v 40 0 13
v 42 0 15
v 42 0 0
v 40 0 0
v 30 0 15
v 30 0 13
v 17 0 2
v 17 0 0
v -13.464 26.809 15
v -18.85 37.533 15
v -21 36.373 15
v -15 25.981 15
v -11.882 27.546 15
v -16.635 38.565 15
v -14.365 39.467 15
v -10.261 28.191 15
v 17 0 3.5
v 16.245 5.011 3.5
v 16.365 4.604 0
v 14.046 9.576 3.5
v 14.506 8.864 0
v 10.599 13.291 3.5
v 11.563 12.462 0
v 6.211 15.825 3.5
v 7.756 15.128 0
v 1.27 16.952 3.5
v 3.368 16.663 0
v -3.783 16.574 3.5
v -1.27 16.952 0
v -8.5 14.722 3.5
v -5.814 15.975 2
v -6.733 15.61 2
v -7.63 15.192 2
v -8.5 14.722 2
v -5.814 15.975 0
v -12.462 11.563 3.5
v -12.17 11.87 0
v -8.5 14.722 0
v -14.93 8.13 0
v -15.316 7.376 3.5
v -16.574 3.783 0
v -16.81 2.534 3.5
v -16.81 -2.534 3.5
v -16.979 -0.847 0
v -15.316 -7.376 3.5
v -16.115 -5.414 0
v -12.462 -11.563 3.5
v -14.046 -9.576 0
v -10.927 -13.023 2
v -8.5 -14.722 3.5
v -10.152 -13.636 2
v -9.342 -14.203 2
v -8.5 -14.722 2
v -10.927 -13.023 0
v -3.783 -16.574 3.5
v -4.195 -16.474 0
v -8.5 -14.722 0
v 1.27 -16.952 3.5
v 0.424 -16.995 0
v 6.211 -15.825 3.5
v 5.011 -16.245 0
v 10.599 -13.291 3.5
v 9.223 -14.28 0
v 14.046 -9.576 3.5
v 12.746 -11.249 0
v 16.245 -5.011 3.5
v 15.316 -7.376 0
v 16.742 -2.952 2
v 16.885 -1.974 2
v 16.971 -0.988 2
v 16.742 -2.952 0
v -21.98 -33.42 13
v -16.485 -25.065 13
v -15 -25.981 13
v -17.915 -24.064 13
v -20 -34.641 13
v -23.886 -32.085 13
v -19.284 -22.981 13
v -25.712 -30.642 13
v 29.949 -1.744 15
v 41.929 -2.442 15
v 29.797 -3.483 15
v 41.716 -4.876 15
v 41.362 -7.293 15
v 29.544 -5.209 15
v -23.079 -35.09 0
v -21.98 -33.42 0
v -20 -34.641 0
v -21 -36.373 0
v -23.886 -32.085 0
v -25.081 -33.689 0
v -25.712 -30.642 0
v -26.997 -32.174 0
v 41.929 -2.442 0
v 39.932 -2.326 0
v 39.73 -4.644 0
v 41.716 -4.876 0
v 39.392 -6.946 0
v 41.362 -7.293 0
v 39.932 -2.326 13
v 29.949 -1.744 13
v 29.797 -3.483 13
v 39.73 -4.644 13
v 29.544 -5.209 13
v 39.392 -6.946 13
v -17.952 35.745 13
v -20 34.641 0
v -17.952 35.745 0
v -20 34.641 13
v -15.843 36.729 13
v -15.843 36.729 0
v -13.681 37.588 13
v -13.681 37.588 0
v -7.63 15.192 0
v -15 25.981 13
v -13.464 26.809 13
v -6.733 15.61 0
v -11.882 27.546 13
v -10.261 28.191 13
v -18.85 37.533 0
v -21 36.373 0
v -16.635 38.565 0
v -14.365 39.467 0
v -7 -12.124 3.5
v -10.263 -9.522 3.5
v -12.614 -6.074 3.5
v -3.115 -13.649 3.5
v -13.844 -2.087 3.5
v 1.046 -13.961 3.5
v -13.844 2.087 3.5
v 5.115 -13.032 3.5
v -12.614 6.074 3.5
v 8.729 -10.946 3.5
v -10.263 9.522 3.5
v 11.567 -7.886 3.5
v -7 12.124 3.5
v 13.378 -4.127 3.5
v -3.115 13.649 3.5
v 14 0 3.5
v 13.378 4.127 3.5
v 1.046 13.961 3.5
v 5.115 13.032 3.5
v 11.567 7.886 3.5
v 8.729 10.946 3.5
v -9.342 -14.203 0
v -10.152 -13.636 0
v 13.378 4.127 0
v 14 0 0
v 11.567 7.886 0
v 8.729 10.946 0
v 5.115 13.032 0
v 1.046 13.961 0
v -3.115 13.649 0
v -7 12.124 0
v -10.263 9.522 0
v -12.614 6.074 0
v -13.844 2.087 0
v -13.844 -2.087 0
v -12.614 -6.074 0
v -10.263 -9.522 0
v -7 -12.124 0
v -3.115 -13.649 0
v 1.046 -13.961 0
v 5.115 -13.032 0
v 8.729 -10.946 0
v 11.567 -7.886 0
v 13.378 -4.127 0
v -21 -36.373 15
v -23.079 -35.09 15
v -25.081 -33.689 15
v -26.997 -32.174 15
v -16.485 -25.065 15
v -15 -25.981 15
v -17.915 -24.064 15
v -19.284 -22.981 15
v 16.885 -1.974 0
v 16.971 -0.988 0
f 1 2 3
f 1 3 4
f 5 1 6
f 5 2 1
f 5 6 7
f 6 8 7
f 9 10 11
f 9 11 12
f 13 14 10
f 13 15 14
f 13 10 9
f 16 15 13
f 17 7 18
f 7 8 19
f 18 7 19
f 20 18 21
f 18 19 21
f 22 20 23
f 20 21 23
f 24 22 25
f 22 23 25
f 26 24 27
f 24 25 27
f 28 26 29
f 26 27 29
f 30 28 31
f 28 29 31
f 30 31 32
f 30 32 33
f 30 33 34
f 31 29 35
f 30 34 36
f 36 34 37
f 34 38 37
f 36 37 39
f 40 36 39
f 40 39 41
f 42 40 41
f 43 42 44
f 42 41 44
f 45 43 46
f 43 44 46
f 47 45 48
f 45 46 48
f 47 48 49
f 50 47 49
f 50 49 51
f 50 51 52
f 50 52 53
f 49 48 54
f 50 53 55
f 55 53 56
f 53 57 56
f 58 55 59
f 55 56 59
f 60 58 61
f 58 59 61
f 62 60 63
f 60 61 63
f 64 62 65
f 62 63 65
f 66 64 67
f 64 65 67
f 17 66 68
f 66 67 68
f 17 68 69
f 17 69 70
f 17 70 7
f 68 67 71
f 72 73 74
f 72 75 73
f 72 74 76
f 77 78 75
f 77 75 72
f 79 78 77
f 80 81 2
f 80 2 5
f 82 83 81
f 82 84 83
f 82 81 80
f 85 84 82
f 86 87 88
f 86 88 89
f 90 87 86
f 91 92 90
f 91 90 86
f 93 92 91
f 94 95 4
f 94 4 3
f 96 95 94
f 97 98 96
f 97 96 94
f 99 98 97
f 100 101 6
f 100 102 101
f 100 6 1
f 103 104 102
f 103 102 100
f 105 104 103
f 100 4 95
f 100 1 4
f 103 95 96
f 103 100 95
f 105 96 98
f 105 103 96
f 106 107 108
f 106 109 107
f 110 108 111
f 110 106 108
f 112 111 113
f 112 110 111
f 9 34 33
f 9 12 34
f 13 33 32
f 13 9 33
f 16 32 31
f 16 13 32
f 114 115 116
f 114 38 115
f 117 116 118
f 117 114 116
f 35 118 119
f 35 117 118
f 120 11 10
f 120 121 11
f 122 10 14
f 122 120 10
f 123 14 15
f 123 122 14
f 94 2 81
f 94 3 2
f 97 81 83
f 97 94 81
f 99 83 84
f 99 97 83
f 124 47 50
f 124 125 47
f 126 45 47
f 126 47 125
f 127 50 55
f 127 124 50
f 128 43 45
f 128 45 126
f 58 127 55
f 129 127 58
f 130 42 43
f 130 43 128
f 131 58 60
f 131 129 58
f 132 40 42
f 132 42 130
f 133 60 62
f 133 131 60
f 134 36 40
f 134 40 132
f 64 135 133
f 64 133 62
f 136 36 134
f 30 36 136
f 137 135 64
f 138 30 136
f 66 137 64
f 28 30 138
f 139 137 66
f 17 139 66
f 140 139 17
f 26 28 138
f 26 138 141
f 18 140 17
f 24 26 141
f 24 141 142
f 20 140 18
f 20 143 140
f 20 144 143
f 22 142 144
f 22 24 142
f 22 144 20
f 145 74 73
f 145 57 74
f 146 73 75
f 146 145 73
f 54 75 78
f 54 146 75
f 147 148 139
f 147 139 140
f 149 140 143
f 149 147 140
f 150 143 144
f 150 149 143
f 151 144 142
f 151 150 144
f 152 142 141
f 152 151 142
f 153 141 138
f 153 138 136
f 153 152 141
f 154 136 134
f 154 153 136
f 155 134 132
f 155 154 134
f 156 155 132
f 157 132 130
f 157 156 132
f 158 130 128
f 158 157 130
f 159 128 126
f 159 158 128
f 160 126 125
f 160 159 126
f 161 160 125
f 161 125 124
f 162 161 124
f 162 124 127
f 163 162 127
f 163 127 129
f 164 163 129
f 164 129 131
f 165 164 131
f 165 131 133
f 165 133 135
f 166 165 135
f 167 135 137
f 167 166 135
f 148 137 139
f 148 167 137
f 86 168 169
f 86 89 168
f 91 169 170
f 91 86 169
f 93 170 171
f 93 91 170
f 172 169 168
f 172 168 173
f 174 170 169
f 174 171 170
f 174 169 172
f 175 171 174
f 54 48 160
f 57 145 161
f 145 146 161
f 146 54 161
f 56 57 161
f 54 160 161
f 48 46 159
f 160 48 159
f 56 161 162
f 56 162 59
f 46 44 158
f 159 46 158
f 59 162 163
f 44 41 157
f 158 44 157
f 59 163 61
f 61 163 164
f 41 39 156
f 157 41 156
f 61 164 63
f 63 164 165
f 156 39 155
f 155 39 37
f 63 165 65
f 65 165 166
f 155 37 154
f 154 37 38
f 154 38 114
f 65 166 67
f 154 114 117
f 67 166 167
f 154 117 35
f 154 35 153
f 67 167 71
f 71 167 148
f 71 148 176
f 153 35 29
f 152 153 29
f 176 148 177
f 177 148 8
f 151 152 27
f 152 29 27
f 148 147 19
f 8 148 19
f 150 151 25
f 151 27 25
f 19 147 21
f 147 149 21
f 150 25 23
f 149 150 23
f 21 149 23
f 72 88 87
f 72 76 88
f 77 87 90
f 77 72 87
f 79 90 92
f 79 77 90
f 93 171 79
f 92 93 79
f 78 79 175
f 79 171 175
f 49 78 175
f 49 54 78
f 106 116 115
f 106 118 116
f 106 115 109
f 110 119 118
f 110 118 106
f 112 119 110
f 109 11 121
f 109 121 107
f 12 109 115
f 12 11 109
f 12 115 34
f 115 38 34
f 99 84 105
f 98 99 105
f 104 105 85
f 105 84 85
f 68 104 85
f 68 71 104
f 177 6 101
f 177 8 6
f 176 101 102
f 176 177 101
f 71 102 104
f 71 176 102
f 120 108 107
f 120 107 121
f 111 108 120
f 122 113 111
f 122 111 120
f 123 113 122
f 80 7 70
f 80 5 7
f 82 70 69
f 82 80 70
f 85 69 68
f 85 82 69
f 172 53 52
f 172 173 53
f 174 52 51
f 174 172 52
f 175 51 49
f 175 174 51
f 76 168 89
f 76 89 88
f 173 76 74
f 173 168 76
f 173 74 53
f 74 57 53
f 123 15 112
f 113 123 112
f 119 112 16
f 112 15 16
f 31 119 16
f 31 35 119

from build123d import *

# Parameters (mm, degrees)
SKETCH_R           = 17
SKETCH_R_2         = 14
PAD_DEPTH          = 3.5
REVOLUTION_ANGLE   = -10
POLARPATTERN_COUNT = 3


with BuildPart() as part:
    # Sketch → Pad (new body)
    with BuildSketch(Plane.XY):
        Circle(SKETCH_R)
        Circle(SKETCH_R_2, mode=Mode.SUBTRACT)
    extrude(amount=PAD_DEPTH)

    # Sketch001 → Revolution (revolve)
    with BuildSketch(Plane.XZ):
        Polygon((17, 2), (30, 15), (42, 15), (42, 0), (40, 0), (40, 13), (30, 13), (17, 0), align=None)
    revolution = revolve(axis=Axis((0, 0, 0), (0, 0, 1)), revolution_arc=REVOLUTION_ANGLE)

    # PolarPattern: Revolution ×3 about axis
    polarpattern_axis = Axis((0, 0, 0), (0, 0, 1))
    for i in range(1, POLARPATTERN_COUNT):
        add(revolution.rotate(polarpattern_axis, i * 360 / POLARPATTERN_COUNT))


solid = part.part
